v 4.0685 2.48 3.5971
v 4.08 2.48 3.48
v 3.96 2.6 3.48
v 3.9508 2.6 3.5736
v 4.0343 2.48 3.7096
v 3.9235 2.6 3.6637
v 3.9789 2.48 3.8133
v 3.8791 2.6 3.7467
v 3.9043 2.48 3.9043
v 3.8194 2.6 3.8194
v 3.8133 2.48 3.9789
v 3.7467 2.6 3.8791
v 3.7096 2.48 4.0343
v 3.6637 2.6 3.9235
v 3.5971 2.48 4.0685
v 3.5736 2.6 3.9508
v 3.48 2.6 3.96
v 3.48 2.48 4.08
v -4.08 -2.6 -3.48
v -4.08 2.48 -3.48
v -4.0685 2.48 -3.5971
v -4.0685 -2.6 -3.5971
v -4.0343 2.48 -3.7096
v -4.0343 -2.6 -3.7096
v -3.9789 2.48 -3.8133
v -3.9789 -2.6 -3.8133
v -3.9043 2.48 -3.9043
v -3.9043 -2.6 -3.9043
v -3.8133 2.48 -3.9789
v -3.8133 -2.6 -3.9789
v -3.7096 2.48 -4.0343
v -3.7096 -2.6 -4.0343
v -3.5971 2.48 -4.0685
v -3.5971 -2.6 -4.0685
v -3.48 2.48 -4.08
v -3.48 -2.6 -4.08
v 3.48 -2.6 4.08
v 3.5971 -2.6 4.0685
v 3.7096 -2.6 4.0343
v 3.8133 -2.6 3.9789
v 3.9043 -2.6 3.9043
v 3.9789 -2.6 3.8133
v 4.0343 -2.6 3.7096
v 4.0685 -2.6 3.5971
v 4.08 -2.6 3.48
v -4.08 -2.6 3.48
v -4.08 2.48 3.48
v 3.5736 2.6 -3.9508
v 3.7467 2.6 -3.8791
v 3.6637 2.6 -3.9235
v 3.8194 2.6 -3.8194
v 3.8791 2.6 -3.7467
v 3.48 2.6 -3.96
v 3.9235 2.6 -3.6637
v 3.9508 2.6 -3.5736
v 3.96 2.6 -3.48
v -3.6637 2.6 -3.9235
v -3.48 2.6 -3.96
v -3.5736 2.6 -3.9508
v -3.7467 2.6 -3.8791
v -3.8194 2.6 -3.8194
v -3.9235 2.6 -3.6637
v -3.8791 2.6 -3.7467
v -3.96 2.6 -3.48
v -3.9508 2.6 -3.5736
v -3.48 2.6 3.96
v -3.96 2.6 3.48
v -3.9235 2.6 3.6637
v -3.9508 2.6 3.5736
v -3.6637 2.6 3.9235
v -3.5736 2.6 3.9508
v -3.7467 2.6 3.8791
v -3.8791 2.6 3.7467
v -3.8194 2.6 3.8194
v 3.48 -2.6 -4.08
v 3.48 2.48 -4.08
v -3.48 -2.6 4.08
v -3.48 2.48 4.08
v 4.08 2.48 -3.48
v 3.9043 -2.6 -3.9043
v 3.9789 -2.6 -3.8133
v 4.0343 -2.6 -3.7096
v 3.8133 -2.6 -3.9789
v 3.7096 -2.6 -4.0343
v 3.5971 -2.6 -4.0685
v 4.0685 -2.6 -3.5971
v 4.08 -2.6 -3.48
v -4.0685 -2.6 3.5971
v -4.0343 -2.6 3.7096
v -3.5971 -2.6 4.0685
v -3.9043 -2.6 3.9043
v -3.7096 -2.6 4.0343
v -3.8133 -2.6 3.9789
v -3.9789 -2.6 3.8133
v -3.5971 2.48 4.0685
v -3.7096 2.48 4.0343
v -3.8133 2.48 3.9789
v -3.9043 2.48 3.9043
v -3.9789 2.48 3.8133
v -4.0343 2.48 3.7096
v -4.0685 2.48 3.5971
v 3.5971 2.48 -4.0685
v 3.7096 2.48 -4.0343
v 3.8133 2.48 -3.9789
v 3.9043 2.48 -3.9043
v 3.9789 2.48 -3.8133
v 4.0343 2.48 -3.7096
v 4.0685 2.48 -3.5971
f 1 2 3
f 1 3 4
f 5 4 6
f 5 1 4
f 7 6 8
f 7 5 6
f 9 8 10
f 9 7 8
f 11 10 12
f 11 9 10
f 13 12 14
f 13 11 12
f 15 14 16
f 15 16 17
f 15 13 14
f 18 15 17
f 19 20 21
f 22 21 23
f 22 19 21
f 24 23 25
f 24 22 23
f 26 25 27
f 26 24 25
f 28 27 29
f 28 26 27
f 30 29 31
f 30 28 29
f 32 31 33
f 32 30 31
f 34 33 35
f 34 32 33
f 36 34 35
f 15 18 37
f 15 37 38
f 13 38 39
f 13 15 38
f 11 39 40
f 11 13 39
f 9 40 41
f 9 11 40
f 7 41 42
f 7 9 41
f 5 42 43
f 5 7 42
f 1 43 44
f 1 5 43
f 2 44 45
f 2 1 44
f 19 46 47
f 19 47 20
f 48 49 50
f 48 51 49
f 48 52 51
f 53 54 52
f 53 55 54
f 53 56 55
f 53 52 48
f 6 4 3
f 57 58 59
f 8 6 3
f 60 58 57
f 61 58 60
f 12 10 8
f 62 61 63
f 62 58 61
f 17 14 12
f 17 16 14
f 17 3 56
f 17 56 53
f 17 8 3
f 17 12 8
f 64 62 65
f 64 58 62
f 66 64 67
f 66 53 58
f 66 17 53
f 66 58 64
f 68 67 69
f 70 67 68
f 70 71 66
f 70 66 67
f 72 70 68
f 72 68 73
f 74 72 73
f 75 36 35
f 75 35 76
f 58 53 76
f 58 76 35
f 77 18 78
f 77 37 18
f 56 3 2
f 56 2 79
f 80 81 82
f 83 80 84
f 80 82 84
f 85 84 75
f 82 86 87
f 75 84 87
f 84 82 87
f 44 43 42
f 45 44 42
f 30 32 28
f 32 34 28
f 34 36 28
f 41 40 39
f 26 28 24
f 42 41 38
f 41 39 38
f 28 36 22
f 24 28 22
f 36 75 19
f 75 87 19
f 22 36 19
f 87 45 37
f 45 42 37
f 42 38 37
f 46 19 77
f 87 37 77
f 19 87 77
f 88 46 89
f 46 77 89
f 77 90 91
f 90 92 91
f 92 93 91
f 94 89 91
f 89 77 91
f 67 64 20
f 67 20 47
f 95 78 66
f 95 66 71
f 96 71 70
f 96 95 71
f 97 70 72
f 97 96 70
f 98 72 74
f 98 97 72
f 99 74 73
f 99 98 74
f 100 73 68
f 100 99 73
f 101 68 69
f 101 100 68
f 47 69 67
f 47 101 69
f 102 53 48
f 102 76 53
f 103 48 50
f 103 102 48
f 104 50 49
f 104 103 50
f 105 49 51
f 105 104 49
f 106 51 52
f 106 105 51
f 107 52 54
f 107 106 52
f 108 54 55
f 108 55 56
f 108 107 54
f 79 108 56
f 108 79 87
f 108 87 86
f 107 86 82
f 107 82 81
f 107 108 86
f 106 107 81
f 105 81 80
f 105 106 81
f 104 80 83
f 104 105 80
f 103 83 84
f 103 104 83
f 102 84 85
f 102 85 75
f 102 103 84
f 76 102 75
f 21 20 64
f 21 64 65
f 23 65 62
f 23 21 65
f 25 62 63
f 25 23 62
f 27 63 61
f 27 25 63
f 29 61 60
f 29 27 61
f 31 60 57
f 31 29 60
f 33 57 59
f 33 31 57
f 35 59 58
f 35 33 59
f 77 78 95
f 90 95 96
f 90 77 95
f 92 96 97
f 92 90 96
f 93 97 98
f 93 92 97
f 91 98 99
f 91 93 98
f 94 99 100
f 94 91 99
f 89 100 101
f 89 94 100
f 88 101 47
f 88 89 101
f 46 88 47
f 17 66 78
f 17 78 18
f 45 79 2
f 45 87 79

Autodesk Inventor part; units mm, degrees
ref_plane "YZ Plane" through (0, 0, 0) normal (1, 0, 0) x (0, 1, 0)
ref_plane "XZ Plane" through (0, 0, 0) normal (0, 1, 0) x (-1, 0, 0)
ref_plane "XY Plane" through (0, 0, 0) normal (0, 0, 1) x (1, 0, 0)
sketch "Sketch2" plane through (0, 0, 0) normal (0, 1, 0) x (-1, 0, 0)
  line L0 (-4.08, 4.08) -> (4.08, 4.08)
  line L1 (4.08, 4.08) -> (4.08, -4.08)
  line L2 (4.08, -4.08) -> (-4.08, -4.08)
  line L3 (-4.08, -4.08) -> (-4.08, 4.08)
  point P0 (0, 0)
  point P1 (0, 4.08)
  point P2 (-4.08, 0)
  dimension "d0" = 8.16
extrude "Extrusion1" add sketch "Sketch2" along normal mid plane 5.2
fillet "Fillet1" radius 0.6 4 edges at (-4.08, 0, 4.08) (4.08, 0, 4.08) (4.08, 0, -4.08) (-4.08, 0, -4.08)
chamfer "Chamfer1" distance 0.12 angle 45 8 edges at (0, 2.6, 4.08) (3.9043, 2.6, 3.9043) (4.08, 2.6, 0) (3.9043, 2.6, -3.9043) (0, 2.6, -4.08) (-3.9043, 2.6, -3.9043) (-4.08, 2.6, 0) (-3.9043, 2.6, 3.9043)
properties part number "99146-LtBluishGray" material "ABS Plastic"
